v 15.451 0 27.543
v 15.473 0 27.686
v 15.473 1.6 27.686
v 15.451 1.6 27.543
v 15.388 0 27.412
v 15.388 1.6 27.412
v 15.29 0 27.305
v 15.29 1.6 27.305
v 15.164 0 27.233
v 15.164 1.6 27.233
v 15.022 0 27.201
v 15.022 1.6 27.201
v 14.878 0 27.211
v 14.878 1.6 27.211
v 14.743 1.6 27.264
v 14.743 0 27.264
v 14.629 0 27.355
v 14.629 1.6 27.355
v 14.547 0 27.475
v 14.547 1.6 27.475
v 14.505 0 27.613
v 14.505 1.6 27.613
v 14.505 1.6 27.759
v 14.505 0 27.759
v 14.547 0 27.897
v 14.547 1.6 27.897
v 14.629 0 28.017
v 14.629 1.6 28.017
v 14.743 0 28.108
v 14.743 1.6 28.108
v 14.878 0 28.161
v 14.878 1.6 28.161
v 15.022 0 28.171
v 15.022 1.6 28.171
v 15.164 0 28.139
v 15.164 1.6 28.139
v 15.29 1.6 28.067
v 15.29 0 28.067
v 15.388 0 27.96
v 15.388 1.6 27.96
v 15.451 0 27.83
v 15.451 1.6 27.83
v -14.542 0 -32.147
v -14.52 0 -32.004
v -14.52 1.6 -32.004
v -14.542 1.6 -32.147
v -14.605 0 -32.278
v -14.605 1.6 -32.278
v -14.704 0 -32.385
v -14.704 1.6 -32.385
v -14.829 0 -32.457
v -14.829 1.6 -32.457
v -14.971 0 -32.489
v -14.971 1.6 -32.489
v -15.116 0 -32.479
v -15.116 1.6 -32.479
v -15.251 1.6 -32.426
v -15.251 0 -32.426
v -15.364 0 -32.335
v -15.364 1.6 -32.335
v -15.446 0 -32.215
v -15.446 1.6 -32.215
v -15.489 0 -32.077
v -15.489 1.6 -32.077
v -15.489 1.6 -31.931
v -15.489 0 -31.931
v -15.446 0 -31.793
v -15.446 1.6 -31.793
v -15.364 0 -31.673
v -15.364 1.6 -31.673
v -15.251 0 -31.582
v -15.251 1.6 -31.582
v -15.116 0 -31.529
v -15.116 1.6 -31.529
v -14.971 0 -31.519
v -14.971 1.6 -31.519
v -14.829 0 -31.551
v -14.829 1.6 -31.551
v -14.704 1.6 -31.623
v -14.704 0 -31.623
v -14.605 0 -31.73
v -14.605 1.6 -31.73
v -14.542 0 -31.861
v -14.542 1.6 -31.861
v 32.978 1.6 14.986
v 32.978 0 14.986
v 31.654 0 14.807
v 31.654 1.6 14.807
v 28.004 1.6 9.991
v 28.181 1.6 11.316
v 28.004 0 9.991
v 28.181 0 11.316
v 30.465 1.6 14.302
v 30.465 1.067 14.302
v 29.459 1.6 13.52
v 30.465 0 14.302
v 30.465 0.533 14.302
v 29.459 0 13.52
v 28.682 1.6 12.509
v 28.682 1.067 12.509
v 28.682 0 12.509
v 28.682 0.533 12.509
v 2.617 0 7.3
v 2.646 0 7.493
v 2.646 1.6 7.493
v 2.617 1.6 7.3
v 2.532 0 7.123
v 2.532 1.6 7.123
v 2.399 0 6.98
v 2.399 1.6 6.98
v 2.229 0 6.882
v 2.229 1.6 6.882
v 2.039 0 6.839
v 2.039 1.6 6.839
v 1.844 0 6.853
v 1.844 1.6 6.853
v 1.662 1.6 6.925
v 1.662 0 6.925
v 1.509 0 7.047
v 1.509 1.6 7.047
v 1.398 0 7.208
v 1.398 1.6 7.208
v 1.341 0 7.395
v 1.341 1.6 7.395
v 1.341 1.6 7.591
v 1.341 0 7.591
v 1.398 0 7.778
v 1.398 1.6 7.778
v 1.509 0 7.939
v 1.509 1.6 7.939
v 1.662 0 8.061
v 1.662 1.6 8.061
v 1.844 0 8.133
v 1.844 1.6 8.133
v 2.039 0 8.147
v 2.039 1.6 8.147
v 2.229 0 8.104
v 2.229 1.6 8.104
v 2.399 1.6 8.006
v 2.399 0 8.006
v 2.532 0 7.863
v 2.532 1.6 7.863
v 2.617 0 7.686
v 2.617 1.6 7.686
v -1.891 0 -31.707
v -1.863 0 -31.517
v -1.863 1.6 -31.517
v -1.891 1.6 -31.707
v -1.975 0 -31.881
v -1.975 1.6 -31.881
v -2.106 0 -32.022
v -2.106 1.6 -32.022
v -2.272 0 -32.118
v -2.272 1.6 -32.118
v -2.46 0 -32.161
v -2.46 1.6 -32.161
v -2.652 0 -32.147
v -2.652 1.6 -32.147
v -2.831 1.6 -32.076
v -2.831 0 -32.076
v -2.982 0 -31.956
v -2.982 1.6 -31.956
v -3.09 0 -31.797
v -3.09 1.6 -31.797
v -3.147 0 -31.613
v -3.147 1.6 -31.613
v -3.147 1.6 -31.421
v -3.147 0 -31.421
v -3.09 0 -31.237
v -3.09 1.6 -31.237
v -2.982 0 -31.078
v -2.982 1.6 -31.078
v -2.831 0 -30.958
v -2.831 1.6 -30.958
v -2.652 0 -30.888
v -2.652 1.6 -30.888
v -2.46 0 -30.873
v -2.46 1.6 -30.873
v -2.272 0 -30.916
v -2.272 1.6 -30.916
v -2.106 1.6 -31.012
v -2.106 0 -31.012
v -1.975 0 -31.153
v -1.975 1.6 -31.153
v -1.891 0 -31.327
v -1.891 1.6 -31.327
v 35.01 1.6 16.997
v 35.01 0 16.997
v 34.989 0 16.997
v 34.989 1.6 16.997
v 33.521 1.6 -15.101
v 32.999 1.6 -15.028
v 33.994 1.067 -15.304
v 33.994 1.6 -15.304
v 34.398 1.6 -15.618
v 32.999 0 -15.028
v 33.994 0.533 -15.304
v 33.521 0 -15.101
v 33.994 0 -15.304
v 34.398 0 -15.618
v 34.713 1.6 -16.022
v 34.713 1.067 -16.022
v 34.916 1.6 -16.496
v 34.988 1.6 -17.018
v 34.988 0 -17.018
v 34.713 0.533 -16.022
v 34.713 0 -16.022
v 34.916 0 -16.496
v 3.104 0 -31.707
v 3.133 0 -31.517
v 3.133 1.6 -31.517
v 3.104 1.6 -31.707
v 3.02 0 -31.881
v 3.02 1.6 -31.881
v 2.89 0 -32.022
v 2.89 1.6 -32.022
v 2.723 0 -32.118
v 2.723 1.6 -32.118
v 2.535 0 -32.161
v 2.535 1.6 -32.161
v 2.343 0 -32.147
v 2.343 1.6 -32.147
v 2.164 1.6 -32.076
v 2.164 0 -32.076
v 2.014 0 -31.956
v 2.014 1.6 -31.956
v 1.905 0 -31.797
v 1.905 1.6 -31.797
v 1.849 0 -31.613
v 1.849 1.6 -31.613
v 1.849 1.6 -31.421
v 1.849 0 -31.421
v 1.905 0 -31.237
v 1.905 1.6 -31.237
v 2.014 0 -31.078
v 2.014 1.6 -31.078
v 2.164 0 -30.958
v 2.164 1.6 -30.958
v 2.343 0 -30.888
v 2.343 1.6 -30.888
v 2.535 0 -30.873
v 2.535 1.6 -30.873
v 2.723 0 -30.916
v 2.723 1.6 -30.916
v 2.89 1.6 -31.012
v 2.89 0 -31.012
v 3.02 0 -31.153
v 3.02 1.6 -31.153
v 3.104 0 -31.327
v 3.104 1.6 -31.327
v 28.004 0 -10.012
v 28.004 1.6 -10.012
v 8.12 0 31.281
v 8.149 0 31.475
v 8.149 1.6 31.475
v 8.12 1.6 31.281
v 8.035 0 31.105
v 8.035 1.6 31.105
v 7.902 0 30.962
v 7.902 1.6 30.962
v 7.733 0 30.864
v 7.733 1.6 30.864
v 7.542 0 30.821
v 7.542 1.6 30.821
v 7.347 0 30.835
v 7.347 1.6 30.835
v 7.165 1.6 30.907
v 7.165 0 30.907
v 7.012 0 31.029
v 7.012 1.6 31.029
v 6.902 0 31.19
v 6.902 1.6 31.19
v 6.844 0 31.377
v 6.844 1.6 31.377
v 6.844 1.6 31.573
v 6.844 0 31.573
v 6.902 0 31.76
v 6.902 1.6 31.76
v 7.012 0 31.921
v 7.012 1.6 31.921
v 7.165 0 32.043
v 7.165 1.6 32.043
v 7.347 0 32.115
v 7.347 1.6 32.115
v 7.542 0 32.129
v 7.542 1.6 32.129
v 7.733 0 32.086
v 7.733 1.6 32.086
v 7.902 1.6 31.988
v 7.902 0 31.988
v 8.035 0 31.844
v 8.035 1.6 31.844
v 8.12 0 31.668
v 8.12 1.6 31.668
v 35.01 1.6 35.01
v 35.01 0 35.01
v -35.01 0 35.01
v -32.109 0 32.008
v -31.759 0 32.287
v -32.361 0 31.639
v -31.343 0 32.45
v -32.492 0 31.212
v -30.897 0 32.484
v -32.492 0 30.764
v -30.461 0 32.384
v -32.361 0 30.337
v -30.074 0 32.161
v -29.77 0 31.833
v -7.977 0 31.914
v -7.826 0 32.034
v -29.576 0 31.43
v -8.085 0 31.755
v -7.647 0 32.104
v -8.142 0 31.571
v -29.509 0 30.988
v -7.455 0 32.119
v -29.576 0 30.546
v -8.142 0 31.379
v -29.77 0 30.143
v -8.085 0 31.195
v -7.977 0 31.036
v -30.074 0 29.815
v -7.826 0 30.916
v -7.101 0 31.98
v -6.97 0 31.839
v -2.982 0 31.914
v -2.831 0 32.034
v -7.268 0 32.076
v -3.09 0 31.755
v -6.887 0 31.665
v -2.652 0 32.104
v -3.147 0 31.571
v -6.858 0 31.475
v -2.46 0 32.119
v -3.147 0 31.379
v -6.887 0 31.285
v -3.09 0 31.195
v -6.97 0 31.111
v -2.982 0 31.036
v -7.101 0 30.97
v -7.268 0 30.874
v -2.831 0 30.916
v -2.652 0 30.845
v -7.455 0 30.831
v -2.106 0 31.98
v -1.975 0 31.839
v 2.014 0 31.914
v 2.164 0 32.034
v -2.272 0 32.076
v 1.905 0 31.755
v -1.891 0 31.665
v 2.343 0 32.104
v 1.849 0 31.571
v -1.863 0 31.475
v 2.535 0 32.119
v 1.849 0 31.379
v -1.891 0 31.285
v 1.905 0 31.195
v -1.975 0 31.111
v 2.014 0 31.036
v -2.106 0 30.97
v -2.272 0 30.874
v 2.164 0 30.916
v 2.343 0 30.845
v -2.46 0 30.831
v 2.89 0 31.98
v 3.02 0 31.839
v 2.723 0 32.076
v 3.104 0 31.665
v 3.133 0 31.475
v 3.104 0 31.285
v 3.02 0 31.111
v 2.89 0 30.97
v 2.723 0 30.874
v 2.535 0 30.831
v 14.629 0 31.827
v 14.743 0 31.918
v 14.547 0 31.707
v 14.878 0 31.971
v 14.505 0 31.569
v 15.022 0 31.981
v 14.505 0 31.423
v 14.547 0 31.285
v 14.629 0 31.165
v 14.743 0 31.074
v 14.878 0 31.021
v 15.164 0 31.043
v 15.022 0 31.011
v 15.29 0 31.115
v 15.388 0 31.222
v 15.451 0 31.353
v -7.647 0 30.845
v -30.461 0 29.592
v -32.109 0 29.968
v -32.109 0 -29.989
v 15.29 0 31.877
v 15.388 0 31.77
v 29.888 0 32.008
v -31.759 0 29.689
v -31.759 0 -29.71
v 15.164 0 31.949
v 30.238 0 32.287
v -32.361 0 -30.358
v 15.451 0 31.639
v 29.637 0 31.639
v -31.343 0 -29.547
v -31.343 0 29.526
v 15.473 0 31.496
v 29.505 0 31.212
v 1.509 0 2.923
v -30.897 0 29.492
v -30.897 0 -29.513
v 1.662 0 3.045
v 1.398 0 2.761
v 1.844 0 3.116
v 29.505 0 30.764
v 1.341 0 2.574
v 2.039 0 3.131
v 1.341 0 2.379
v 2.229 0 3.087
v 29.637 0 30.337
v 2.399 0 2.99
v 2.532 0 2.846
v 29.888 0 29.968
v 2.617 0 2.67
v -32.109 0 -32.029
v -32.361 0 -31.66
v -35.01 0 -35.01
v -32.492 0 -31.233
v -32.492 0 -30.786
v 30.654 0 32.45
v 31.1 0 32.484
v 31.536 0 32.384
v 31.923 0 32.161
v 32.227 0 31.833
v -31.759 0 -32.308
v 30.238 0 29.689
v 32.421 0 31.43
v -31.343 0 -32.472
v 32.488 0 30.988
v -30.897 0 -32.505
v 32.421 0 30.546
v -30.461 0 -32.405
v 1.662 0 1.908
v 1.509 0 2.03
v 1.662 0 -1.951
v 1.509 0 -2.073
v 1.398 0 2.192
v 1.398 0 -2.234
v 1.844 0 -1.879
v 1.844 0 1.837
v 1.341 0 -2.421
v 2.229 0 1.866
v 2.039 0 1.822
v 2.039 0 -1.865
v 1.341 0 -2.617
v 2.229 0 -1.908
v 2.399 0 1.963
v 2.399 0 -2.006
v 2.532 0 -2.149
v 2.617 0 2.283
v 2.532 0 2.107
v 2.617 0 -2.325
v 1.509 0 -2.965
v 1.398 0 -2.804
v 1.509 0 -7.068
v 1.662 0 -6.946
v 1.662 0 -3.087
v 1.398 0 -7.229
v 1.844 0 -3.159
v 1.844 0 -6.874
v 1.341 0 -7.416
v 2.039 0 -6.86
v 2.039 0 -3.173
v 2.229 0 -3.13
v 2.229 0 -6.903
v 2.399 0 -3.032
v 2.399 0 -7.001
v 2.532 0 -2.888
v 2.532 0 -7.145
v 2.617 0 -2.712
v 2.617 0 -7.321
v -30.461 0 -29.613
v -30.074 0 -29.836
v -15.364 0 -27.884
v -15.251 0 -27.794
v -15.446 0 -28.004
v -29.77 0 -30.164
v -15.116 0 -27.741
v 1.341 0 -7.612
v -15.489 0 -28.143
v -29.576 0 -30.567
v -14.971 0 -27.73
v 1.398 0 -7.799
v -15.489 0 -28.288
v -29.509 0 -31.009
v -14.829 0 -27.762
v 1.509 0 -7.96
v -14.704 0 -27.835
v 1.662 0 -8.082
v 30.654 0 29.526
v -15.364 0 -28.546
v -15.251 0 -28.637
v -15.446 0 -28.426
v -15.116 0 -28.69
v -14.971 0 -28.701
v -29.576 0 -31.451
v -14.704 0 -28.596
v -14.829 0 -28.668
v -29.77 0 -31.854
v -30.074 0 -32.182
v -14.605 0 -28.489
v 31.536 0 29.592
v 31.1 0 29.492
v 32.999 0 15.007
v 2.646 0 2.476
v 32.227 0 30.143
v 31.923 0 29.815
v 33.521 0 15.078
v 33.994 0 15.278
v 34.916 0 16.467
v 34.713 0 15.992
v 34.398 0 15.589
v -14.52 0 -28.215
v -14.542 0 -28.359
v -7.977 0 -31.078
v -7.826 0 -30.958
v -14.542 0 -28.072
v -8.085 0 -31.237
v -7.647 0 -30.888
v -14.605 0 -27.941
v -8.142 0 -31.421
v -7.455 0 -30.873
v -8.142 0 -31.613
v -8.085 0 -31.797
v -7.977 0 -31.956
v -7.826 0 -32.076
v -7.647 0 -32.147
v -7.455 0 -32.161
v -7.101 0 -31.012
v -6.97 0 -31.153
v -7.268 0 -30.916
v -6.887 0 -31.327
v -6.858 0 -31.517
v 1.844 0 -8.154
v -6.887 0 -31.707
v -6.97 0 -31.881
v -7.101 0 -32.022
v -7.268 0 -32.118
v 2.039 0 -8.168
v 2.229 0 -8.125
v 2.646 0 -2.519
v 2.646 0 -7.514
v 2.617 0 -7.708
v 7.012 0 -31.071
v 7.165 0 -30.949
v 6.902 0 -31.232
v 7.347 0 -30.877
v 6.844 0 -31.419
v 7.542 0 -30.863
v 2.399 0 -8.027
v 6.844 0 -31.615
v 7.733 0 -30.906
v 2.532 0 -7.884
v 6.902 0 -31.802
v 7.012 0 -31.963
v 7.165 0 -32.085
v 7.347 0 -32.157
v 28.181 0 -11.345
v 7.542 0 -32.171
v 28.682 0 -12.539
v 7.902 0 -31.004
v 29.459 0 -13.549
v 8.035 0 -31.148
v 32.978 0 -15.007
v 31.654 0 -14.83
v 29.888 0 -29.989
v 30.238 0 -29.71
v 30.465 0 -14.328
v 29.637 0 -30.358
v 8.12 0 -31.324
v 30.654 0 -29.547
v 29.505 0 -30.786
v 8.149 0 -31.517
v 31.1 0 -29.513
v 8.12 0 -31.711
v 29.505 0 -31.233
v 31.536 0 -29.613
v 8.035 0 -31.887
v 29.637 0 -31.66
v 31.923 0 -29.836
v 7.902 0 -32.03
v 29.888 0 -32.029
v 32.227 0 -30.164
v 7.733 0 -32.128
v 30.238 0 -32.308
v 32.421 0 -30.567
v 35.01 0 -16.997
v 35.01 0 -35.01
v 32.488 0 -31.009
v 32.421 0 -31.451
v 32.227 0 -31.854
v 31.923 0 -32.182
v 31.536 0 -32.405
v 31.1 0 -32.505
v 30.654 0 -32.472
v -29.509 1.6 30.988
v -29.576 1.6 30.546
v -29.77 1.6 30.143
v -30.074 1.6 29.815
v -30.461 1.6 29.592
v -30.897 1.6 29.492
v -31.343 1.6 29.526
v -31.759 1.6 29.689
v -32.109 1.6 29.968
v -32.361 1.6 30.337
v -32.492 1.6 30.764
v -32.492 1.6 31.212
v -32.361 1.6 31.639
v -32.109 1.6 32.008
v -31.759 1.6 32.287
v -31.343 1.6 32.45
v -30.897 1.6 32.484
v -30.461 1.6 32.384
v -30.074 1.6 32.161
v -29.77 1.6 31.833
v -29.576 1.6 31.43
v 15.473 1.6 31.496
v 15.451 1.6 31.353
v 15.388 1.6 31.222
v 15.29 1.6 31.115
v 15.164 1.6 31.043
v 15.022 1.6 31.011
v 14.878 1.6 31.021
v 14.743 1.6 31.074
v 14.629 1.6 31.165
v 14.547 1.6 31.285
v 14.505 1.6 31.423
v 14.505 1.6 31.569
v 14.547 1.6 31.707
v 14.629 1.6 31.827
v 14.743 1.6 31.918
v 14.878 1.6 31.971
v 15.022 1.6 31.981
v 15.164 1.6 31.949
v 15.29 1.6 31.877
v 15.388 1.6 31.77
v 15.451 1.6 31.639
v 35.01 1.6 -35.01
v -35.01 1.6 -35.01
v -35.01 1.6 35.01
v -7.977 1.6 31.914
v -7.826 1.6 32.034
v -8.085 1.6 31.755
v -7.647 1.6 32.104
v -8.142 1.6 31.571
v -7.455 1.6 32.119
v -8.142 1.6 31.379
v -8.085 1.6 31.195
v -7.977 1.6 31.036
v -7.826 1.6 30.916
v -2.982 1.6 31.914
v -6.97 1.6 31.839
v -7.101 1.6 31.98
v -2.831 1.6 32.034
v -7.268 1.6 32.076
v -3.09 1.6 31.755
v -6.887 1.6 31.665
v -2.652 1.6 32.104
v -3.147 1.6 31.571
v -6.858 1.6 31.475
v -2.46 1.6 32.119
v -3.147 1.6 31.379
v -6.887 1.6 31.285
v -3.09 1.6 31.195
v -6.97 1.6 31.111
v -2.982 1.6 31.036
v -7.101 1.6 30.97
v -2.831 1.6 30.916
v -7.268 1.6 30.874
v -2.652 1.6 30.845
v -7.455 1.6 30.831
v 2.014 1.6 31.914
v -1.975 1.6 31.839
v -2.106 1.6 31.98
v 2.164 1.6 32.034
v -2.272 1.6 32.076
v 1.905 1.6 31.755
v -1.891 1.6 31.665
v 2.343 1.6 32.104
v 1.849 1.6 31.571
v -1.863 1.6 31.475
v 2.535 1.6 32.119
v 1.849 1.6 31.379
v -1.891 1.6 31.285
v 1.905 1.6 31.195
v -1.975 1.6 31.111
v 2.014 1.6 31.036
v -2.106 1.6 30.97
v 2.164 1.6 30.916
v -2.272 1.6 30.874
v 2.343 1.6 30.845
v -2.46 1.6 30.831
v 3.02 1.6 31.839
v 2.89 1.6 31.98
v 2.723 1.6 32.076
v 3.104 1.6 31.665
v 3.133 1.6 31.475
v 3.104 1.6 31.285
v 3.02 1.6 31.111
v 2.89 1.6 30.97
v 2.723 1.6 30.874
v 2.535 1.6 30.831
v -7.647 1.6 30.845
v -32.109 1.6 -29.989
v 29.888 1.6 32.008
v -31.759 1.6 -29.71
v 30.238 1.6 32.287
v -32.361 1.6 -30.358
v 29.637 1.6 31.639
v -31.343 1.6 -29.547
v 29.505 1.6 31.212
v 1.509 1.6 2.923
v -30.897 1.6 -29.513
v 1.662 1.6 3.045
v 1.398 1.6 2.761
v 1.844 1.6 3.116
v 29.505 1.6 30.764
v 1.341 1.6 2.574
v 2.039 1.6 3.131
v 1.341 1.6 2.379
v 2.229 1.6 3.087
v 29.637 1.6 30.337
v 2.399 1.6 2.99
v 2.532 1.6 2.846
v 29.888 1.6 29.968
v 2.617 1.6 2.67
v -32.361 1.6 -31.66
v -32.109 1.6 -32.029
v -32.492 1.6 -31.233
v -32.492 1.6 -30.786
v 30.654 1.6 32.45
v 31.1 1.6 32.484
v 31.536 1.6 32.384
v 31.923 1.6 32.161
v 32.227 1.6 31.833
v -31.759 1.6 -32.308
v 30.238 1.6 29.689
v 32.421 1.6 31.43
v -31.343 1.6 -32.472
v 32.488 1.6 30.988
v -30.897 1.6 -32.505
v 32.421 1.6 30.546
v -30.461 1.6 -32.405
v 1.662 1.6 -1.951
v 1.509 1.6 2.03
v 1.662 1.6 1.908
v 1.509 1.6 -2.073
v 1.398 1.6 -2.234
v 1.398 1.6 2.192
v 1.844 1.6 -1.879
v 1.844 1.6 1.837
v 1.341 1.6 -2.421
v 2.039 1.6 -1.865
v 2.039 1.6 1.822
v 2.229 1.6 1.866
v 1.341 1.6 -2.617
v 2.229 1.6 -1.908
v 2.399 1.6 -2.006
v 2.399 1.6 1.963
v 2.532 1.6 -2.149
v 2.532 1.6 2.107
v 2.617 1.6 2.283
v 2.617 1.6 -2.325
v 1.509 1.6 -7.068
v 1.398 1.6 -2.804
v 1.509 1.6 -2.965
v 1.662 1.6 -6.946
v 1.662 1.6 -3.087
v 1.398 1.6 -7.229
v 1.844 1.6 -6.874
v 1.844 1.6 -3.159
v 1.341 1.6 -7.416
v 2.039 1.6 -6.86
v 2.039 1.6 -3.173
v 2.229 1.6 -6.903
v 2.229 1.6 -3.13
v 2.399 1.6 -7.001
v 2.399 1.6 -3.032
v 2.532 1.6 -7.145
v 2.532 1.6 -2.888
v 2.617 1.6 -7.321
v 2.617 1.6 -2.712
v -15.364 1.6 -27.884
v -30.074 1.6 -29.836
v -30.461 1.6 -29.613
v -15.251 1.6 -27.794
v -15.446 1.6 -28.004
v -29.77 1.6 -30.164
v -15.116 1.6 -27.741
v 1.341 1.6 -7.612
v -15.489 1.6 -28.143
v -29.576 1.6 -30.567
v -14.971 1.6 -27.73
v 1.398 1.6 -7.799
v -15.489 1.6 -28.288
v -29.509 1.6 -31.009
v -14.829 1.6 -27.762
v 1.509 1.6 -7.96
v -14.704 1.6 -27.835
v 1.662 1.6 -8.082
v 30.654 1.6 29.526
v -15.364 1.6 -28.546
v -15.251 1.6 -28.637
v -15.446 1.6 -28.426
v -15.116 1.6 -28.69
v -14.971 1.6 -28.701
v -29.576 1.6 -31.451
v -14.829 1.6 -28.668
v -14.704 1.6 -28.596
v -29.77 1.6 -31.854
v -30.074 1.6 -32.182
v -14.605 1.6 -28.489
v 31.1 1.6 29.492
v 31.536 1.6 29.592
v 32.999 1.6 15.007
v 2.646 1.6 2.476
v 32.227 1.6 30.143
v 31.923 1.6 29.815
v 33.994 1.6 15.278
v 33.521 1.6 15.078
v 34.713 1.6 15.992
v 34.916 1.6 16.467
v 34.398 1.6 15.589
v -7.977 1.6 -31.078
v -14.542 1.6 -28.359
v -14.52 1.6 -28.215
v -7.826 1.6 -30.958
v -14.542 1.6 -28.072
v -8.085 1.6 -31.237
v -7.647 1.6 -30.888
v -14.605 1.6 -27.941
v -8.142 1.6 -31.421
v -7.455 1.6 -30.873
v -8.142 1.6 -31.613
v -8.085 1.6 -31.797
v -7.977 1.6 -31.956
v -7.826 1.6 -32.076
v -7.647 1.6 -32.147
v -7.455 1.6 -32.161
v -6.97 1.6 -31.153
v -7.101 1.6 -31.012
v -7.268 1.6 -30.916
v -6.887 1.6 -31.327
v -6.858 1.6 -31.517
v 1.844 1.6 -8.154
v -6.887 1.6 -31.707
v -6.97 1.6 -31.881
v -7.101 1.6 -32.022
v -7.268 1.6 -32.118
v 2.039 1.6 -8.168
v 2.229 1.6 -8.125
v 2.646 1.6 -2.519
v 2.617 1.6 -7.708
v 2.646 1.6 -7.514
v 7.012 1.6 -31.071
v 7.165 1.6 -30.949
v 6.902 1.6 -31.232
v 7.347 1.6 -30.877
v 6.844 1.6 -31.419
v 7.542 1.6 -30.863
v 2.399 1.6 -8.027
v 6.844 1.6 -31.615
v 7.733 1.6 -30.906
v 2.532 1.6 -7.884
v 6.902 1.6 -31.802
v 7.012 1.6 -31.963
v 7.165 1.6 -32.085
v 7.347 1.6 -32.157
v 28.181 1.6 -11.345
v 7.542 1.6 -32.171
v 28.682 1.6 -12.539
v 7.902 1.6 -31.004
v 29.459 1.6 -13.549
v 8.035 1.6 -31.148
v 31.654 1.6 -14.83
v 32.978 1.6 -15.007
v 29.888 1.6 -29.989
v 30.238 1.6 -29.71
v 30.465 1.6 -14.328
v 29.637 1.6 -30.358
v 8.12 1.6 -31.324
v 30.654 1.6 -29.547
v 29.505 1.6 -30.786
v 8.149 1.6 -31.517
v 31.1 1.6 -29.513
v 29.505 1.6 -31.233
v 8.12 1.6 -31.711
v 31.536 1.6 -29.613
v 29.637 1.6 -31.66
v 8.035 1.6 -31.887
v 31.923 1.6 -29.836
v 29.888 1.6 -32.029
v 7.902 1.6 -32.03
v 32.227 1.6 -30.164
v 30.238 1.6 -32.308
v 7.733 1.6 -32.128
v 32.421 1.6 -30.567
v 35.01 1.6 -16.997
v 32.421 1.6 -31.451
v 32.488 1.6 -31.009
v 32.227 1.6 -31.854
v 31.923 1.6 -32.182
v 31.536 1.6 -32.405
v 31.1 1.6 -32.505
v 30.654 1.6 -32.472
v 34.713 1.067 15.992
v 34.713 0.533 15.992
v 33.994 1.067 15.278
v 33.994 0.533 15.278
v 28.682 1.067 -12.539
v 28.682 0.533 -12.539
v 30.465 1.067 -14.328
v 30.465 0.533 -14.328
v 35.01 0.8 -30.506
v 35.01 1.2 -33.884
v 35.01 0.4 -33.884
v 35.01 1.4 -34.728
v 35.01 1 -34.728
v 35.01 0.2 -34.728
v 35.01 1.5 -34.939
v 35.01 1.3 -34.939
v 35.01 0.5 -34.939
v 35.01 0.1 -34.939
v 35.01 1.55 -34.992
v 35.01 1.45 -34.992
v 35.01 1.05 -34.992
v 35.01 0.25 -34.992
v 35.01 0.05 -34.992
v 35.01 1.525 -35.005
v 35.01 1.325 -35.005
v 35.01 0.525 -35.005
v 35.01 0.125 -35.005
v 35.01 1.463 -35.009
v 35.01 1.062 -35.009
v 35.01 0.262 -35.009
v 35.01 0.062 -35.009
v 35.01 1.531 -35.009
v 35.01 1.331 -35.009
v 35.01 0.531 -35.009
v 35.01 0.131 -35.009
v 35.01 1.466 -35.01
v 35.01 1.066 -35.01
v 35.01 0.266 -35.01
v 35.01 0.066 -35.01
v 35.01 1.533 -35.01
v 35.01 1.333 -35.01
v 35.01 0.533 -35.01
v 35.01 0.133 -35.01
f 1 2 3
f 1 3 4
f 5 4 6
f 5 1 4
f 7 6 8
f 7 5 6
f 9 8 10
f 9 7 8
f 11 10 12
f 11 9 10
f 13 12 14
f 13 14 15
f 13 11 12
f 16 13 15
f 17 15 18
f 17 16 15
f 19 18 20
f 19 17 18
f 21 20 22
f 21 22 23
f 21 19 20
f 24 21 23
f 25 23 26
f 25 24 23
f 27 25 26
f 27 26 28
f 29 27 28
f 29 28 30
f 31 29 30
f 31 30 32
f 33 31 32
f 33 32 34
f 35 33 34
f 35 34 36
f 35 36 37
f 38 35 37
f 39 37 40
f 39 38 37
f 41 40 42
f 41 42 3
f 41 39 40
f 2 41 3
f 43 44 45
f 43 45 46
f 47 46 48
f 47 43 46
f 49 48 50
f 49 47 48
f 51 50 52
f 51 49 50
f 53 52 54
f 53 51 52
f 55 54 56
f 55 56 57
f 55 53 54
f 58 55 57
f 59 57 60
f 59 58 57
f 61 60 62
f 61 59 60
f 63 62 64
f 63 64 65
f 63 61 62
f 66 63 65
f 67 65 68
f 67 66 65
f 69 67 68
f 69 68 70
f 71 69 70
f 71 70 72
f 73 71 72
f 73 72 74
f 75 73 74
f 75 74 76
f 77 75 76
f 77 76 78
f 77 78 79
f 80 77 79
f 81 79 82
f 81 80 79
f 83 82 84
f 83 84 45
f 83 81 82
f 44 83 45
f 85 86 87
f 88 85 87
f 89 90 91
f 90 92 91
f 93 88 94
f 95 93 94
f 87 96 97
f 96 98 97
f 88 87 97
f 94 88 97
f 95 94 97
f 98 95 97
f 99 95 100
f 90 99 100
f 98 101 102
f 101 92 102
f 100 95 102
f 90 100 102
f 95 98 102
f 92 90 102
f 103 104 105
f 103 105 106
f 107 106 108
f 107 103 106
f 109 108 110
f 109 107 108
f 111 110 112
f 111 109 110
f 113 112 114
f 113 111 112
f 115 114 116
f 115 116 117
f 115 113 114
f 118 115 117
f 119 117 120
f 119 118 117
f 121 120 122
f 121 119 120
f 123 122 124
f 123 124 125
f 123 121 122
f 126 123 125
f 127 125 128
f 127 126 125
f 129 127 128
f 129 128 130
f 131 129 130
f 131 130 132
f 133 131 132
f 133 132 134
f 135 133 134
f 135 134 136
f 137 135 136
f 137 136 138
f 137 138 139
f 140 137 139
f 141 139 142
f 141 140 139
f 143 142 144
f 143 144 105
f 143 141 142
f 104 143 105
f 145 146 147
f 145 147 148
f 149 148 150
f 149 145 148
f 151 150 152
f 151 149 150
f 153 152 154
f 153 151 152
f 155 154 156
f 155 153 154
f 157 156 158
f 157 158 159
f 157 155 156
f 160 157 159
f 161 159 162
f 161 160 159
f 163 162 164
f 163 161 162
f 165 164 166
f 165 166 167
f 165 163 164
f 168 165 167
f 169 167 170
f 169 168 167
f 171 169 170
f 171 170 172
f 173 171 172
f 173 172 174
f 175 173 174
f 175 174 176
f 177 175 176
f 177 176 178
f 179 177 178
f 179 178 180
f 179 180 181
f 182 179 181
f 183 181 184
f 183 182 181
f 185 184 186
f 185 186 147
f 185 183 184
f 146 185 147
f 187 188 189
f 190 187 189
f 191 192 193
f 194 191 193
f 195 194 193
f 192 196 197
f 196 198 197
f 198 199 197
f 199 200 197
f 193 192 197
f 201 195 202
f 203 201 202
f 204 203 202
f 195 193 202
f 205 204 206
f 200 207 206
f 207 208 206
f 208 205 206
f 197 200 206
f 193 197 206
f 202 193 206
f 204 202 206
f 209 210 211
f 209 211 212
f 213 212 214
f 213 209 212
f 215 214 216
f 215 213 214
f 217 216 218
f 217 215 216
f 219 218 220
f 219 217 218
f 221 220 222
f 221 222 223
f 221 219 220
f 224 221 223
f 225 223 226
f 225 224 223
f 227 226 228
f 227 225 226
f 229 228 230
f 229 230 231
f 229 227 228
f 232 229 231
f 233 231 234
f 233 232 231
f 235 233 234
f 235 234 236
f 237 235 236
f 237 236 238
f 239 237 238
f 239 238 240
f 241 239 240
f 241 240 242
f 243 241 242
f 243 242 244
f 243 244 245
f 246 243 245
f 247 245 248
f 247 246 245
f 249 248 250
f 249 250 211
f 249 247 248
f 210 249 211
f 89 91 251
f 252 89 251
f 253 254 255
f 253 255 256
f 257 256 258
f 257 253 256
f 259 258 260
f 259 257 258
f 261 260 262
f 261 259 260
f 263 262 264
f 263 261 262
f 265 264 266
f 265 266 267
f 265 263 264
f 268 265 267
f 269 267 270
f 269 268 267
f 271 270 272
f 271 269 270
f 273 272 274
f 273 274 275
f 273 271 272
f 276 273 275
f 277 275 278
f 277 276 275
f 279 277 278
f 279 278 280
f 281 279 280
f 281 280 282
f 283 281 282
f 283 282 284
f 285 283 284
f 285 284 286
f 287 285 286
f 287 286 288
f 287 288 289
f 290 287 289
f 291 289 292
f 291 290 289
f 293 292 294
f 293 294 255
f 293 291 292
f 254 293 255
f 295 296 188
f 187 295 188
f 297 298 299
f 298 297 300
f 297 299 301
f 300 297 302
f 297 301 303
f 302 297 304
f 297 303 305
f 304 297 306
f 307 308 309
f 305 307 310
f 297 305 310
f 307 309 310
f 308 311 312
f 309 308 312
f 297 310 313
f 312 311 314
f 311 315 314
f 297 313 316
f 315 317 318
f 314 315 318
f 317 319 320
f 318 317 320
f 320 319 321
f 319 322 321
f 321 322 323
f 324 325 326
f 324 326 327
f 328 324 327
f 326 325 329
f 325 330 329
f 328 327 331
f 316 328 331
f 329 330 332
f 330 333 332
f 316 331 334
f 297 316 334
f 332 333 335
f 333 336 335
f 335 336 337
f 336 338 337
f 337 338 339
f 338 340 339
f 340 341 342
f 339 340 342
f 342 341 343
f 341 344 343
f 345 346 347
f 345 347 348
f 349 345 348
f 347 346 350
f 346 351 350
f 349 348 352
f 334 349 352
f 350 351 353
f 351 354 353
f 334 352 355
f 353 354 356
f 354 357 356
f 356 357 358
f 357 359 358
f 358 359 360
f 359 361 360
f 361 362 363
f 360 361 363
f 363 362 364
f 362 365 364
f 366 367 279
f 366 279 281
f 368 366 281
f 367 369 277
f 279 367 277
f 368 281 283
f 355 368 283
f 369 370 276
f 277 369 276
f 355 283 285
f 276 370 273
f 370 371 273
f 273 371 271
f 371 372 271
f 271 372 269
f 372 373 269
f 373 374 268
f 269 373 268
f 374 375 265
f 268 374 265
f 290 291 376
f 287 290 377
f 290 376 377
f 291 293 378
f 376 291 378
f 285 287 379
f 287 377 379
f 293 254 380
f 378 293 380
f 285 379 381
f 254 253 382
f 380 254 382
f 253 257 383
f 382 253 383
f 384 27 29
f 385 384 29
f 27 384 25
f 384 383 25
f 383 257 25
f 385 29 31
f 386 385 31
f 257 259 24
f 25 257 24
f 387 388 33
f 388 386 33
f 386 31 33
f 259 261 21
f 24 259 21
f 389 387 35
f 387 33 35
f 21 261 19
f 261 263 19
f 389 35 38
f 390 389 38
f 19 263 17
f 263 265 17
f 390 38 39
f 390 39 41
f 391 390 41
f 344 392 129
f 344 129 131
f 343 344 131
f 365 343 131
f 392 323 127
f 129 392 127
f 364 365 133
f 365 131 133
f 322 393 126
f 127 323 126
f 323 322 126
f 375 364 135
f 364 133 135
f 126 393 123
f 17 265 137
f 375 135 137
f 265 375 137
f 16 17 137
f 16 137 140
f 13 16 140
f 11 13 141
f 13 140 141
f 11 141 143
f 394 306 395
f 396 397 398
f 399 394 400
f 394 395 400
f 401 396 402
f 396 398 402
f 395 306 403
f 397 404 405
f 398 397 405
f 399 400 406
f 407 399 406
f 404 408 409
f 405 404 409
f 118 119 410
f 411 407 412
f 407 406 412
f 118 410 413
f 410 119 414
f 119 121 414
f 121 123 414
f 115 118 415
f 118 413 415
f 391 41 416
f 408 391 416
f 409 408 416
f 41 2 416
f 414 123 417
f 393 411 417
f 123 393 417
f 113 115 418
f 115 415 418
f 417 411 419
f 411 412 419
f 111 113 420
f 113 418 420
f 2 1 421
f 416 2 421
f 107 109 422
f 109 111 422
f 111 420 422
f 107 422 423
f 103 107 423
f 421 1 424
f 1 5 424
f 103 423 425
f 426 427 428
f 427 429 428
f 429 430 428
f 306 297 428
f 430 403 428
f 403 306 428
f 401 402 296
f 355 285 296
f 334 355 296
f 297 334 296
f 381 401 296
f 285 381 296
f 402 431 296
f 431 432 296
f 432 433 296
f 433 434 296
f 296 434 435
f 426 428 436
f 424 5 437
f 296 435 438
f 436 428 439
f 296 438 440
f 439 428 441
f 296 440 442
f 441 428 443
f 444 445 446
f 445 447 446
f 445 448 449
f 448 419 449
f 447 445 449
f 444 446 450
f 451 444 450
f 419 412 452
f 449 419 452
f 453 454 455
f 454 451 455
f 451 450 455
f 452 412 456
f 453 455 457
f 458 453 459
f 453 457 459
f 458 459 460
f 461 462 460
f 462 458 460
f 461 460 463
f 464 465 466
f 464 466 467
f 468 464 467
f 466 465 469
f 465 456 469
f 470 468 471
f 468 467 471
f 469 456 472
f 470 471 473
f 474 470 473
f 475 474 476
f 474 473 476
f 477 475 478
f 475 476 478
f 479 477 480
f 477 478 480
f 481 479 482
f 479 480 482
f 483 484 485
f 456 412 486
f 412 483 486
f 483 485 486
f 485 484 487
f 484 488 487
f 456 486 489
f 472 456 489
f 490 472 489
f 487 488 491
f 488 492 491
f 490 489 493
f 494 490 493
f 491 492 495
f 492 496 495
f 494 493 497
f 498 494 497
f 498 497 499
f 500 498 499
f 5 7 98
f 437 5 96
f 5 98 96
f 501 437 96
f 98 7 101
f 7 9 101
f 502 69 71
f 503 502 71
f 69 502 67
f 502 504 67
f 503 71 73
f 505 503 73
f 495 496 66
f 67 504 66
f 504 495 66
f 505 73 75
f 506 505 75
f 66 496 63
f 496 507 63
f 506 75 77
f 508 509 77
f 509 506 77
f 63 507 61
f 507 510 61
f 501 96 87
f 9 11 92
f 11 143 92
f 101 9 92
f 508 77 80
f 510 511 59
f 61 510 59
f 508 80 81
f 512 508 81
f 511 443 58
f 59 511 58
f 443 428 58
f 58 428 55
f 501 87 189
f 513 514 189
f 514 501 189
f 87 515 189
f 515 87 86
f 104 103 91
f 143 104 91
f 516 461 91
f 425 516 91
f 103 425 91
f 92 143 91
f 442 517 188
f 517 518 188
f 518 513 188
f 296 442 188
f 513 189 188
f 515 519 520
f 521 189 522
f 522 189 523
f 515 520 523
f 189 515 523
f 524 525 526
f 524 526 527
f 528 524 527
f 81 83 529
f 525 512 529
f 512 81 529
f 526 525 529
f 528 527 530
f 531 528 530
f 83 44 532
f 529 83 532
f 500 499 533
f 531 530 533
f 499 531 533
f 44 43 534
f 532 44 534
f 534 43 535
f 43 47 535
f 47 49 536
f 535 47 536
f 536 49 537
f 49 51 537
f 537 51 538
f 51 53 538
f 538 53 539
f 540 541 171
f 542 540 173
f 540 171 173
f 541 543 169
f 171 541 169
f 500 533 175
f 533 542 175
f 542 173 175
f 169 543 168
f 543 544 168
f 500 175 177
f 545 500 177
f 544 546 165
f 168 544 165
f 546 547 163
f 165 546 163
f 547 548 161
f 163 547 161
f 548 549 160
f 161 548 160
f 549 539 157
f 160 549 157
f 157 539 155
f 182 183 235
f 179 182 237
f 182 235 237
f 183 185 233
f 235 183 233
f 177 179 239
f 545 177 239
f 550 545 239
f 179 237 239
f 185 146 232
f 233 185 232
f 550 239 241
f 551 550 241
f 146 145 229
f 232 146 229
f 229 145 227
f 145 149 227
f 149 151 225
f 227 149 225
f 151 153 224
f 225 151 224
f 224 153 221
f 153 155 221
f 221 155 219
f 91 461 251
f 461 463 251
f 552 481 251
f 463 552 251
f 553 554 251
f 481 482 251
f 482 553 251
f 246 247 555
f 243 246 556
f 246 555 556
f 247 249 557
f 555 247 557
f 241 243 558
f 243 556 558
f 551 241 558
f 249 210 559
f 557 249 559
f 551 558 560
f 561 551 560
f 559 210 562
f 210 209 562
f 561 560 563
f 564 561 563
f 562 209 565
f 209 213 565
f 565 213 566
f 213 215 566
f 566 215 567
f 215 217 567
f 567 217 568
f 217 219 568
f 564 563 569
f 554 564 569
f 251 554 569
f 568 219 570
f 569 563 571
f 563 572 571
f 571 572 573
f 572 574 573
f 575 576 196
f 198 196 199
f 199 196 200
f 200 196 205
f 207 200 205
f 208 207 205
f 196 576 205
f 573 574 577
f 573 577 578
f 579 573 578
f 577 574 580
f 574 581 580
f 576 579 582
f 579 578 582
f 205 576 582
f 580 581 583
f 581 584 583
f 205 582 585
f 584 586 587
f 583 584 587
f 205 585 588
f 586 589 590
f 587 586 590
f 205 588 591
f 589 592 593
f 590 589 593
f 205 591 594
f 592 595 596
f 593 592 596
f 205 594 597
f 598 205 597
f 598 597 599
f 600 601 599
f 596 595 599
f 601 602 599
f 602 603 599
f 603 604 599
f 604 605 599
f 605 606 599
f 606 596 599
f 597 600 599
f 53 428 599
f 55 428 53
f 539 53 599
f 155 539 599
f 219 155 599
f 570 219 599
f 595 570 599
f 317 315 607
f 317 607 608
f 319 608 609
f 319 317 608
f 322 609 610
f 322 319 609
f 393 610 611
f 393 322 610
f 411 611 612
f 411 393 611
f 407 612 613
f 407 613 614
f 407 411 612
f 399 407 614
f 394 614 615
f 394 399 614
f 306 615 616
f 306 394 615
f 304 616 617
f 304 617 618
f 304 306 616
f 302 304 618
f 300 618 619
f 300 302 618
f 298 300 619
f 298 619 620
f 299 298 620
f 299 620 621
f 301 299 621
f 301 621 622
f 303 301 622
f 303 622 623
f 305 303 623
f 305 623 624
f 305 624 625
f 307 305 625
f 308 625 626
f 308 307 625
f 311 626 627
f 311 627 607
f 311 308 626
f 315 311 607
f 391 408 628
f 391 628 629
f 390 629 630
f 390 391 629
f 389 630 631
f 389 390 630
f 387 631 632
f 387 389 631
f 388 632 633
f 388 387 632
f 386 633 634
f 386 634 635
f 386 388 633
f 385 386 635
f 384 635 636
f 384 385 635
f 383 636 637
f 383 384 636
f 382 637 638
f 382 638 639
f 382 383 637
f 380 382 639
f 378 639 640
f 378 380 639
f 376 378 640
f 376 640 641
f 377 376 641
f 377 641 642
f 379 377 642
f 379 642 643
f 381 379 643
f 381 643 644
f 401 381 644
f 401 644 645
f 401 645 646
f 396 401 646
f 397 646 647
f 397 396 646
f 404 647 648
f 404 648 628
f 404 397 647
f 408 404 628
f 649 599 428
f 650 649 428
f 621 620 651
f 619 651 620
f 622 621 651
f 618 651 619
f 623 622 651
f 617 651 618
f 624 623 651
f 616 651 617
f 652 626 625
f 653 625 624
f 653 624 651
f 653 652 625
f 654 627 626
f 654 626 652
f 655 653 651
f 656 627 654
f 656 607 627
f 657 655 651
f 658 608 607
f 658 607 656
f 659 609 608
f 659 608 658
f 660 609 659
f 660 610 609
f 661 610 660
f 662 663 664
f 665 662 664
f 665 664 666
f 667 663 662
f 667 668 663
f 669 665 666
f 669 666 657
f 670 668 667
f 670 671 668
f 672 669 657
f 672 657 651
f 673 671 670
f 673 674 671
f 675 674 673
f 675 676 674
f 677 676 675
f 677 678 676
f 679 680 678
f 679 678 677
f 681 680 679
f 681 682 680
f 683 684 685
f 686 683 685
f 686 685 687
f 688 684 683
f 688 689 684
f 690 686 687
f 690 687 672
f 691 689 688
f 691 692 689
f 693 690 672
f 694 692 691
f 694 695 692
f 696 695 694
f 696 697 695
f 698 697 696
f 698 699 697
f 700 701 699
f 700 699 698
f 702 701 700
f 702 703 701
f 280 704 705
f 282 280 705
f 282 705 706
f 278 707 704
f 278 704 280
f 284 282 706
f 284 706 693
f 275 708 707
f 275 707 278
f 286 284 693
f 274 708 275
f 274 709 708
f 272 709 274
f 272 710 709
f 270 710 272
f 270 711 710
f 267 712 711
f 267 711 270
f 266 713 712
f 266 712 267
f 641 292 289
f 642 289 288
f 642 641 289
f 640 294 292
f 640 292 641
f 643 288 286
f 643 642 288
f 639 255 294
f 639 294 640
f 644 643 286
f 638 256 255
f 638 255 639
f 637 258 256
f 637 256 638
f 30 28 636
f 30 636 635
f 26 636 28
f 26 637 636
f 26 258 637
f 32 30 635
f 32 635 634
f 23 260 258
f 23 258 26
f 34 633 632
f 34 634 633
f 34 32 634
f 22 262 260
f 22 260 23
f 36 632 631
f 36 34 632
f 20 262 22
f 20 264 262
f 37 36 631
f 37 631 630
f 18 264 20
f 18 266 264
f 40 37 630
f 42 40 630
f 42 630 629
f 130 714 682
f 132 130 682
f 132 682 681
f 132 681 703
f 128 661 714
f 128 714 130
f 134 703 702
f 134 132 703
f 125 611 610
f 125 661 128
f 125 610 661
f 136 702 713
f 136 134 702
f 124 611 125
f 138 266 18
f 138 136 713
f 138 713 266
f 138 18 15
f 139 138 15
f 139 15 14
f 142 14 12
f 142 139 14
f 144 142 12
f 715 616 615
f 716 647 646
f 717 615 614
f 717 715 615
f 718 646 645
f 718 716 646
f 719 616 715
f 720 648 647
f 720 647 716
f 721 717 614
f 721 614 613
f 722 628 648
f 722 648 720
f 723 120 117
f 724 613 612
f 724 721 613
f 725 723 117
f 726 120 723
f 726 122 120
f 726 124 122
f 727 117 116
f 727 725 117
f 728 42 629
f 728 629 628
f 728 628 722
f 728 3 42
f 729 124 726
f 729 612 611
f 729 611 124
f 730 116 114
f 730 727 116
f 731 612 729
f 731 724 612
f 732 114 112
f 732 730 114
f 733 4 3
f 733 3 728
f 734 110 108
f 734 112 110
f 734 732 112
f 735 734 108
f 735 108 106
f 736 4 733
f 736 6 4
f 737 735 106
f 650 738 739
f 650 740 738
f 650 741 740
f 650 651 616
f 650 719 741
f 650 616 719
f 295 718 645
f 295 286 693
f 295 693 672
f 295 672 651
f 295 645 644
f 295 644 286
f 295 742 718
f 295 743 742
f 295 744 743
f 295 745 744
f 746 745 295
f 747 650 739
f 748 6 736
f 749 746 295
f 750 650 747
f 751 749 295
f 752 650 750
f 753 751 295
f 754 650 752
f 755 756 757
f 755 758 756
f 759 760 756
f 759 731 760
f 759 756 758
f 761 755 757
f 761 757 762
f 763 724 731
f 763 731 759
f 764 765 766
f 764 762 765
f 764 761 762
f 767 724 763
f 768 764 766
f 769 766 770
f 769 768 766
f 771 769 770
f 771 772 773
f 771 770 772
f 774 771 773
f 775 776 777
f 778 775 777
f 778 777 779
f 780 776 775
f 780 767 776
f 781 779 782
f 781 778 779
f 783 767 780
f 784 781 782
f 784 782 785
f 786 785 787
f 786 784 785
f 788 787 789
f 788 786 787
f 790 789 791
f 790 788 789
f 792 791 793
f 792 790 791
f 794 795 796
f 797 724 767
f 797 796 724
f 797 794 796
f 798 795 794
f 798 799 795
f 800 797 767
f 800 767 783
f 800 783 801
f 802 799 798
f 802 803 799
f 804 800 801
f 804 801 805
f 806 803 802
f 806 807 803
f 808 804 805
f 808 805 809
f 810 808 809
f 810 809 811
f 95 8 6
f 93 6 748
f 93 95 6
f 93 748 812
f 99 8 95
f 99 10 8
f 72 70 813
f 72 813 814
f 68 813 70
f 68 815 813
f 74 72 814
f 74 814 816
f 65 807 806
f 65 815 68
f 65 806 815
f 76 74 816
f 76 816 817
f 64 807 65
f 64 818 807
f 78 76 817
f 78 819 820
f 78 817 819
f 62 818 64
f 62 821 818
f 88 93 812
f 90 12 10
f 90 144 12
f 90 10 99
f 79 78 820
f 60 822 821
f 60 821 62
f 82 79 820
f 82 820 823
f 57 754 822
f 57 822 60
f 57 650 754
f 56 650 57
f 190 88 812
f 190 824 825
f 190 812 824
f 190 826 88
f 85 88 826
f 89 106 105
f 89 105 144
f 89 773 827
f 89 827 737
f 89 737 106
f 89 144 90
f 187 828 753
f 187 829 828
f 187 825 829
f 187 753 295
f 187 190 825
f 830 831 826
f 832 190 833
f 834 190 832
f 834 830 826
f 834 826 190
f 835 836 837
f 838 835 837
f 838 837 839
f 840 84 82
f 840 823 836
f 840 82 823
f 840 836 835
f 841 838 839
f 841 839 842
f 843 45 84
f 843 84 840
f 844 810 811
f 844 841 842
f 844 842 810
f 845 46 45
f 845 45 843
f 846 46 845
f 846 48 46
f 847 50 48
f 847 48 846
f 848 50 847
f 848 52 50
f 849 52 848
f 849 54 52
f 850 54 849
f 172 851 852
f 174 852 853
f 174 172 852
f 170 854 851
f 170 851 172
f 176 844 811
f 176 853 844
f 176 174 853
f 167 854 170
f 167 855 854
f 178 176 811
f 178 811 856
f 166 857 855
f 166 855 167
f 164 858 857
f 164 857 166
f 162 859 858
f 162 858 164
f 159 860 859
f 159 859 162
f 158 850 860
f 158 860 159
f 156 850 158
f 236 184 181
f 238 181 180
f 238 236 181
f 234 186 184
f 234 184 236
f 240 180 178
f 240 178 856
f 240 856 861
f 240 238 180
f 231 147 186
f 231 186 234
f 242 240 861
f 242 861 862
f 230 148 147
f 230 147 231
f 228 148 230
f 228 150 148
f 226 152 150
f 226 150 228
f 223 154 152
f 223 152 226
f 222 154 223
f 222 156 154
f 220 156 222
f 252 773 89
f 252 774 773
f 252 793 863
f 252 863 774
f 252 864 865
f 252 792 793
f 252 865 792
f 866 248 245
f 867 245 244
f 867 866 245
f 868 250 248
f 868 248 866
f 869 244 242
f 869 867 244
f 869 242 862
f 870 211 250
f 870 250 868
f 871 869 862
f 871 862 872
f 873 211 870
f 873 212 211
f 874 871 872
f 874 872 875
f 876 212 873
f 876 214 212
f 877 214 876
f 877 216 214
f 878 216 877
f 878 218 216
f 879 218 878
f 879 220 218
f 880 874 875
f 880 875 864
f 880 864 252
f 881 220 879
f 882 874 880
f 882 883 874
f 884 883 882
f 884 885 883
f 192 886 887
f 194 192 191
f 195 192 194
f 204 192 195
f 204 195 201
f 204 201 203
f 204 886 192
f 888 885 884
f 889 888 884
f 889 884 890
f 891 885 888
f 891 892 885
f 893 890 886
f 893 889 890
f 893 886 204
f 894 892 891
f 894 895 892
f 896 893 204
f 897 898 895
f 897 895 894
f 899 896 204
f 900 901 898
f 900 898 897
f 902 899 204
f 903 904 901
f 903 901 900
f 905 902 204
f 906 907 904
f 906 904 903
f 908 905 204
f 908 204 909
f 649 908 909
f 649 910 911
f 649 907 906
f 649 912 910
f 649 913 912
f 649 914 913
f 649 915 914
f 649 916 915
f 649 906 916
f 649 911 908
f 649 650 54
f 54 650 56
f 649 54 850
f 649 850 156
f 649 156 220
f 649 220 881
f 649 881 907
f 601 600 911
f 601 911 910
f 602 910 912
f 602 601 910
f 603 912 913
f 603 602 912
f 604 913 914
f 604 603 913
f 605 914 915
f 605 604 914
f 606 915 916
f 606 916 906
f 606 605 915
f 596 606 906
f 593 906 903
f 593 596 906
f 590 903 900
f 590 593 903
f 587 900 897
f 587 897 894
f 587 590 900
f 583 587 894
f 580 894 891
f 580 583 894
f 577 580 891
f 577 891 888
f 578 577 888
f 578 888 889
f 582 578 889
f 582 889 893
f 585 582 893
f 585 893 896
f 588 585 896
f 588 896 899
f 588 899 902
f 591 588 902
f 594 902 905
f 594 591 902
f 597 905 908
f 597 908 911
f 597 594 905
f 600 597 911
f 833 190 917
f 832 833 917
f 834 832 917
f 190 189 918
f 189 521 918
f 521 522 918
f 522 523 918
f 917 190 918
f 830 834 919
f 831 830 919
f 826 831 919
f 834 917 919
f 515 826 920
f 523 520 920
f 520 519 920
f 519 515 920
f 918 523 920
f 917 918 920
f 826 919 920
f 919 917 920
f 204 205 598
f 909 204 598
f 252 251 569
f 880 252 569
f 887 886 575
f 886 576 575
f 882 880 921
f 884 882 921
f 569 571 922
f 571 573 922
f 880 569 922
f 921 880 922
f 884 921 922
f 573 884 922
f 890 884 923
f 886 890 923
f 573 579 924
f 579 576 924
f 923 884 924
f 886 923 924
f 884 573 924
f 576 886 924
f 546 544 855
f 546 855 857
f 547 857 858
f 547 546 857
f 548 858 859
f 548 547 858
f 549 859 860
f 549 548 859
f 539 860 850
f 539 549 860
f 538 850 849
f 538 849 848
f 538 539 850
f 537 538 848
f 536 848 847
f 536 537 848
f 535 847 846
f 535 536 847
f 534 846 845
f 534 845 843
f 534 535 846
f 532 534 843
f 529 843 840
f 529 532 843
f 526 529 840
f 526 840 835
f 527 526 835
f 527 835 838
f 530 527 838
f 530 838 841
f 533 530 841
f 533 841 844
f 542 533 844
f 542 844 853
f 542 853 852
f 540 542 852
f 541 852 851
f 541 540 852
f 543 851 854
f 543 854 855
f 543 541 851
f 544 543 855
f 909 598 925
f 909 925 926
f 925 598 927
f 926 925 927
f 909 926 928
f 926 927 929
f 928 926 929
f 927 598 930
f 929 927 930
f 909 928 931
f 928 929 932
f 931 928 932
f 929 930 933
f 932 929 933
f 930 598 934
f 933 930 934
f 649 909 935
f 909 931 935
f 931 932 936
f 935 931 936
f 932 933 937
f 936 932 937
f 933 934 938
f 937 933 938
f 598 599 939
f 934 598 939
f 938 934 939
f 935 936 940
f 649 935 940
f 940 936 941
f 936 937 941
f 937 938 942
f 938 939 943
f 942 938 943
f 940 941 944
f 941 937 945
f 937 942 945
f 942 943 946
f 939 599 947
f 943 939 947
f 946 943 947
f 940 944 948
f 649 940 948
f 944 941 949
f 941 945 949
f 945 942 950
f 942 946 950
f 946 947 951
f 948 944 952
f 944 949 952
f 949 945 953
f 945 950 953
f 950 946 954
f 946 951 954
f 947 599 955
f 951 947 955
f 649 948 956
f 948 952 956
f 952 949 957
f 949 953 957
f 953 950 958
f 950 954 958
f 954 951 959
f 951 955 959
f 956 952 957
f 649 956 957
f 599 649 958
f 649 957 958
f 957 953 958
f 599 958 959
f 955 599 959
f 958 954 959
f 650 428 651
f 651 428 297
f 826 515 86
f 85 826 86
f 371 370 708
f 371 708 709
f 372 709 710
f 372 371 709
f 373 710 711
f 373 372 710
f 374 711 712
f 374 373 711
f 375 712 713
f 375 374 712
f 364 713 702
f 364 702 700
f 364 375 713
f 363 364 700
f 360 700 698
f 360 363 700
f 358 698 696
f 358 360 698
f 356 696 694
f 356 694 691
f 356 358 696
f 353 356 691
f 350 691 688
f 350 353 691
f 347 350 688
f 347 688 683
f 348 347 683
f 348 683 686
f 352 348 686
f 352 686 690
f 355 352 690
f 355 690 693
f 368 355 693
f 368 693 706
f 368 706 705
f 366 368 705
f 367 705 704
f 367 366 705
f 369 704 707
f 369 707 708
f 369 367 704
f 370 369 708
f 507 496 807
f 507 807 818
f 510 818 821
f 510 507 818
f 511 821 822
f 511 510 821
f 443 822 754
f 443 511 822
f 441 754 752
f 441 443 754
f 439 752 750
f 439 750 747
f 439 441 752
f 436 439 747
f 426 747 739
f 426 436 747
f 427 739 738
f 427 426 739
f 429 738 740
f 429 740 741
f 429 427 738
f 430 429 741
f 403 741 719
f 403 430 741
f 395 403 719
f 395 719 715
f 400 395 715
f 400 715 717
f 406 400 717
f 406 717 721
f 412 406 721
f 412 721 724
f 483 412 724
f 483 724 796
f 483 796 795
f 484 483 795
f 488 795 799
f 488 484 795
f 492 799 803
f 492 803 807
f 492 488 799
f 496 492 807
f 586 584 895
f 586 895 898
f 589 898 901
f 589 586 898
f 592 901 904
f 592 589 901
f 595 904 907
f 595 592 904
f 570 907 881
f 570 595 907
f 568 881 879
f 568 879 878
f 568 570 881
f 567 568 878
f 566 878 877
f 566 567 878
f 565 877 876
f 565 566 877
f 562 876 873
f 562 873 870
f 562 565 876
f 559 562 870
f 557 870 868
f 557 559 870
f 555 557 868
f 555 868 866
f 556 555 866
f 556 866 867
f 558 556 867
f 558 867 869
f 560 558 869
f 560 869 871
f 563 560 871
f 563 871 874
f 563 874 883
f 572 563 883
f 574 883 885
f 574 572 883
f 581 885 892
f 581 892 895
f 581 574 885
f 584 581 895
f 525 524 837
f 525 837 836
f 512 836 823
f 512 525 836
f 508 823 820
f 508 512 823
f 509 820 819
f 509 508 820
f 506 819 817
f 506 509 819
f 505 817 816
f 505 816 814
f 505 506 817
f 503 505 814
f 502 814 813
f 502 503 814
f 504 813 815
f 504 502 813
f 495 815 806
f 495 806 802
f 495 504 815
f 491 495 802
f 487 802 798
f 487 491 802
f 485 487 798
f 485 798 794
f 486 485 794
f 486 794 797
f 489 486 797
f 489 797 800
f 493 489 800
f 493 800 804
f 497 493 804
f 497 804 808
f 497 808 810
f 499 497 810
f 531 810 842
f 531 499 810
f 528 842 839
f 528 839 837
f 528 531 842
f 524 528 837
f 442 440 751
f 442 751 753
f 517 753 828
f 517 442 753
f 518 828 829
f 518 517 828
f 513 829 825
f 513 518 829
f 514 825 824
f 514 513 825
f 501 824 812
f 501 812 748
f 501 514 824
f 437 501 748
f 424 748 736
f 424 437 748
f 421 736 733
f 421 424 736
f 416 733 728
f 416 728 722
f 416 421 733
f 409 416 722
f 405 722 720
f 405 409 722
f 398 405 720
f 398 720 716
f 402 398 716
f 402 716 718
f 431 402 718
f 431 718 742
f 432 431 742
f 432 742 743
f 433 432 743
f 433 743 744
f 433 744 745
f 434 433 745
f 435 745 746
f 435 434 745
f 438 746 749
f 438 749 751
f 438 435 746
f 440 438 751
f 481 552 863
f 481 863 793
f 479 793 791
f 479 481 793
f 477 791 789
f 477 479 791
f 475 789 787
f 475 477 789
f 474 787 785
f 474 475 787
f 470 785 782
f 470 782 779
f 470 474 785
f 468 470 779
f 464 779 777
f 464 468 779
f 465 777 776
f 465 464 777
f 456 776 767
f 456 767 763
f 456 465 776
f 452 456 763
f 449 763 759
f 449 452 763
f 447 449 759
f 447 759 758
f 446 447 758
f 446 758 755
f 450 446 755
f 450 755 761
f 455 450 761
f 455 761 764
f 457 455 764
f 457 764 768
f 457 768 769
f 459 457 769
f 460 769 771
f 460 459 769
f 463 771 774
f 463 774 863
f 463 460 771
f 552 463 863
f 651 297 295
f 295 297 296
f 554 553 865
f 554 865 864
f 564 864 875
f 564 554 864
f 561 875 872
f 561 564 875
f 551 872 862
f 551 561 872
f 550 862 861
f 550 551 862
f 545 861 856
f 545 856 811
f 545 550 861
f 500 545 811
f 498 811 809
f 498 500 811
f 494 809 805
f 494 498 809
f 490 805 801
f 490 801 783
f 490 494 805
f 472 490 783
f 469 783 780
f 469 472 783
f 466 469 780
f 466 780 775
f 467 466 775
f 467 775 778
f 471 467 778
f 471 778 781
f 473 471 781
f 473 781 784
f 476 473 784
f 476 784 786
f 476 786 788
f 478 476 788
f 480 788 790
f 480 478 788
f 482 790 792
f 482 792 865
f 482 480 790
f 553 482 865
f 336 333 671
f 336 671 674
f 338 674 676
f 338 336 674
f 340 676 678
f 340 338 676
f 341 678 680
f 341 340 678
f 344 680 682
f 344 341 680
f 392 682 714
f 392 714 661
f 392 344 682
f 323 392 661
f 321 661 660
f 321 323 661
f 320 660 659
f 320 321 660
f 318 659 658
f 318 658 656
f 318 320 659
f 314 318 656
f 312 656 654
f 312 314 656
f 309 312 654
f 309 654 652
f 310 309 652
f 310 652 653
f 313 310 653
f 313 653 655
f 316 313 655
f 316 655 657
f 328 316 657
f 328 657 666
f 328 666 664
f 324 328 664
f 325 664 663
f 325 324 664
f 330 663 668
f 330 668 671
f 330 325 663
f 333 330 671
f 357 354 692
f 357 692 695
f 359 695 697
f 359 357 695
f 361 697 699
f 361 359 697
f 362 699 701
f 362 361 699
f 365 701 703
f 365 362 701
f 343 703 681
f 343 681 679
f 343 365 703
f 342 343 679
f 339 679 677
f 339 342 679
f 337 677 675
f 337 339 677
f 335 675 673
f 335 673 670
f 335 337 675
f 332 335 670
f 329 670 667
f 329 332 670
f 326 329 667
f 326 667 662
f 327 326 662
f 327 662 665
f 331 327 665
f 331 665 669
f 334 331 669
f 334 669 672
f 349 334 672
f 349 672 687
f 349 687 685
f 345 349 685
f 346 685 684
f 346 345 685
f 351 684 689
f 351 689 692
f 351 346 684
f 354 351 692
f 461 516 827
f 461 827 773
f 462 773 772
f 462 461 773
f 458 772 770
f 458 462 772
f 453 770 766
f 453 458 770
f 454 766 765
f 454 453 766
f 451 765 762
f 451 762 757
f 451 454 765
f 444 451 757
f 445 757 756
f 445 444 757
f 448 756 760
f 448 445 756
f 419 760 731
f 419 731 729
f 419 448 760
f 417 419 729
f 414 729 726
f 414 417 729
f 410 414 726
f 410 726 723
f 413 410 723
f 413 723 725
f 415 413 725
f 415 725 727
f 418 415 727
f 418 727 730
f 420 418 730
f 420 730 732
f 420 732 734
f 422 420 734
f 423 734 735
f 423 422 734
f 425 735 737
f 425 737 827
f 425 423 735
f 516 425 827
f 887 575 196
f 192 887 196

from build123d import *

# Parameters (mm, degrees)
SKETCH1_R           = 0.645583979
SKETCH1_R_2         = 0.656166882
SKETCH1_R_3         = 0.486835056
SKETCH1_R_4         = 1.5
BOSS_EXTRUDE1_DEPTH = 1.6


with BuildPart() as part:
    # Sketch1 → Boss-Extrude1 (new body)
    with BuildSketch(Plane(origin=(0, 0, 0), x_dir=(1, 0, 0), z_dir=(0, 1, 0))):
        with BuildLine():
            Line((35.009657829, 35.009663213), (-35.009668596, 35.009663213))
            Line((-35.009668596, 35.009663213), (-35.009668596, -35.009663213))
            Line((-35.009668596, -35.009663213), (35.009668596, -35.009663213))
            Line((35.009668596, -35.009663213), (35.009668596, -16.996819979))
            Line((35.009668596, -16.996819979), (34.988502791, -16.996830745))
            add(Edge.make_bspline(
                [(34.988502791, -16.996830745), (34.988502791, -15.896155035), (34.078330096, -15.007158911), (32.998830957, -15.007158912)],
                knots=[6, 6, 6, 6, 7, 7, 7, 7], degree=3))
            Line((32.998830957, -15.007158912), (32.977665152, -14.985993106))
            add(Edge.make_bspline(
                [(32.977665152, -14.985993106), (30.226002792, -14.985993106), (28.003507099, -12.742331608), (28.003507099, -9.990669248)],
                knots=[8, 8, 8, 8, 9, 9, 9, 9], degree=3))
            Line((28.003507099, -9.990669248), (28.003507099, 9.990669248))
            Line((28.003507099, 9.990669248), (28.003507099, 10.011835053))
            add(Edge.make_bspline(
                [(28.003507099, 10.011835053), (28.003507099, 12.784663218), (30.226002792, 15.007158911), (32.977675917, 15.007158911)],
                knots=[11, 11, 11, 11, 12, 12, 12, 12], degree=3))
            Line((32.977675917, 15.007158911), (32.99883634, 15.028319334))
            add(Edge.make_bspline(
                [(32.99883634, 15.028319334), (34.078335478, 15.028322254), (34.988494945, 15.938497412), (34.988492025, 17.017996551)],
                knots=[13, 13, 13, 13, 14, 14, 14, 14], degree=3))
            Line((34.988492025, 17.017996551), (35.00965783, 16.996830745))
            add(Edge.make_bspline(
                [(35.00965783, 16.996830745), (35.009657829, 35.009673979), (35.009657829, 35.009663213)],
                knots=[0, 0, 0, 1, 1, 1], degree=2))
        make_face()
        with Locations((-7.503590222, 31.517165368)):
            Circle(SKETCH1_R, mode=Mode.SUBTRACT)
        with Locations((-2.508255598, 31.517165368)):
            Circle(SKETCH1_R, mode=Mode.SUBTRACT)
        with Locations((2.487079026, 31.517165369)):
            Circle(SKETCH1_R, mode=Mode.SUBTRACT)
        with Locations((7.492996552, 31.517165369)):
            Circle(SKETCH1_R_2, mode=Mode.SUBTRACT)
        with Locations((-15.007175061, 28.215170536)):
            Circle(SKETCH1_R_3, mode=Mode.SUBTRACT)
        with Locations((-15.007175061, 32.004000424)):
            Circle(SKETCH1_R_3, mode=Mode.SUBTRACT)
        with Locations((1.989661068, 7.51416236)):
            Circle(SKETCH1_R_2, mode=Mode.SUBTRACT)
        with Locations((1.989661069, 2.518838502)):
            Circle(SKETCH1_R_2, mode=Mode.SUBTRACT)
        with Locations((1.989661069, -2.476496122)):
            Circle(SKETCH1_R_2, mode=Mode.SUBTRACT)
        with Locations((1.989661069, -7.492996551)):
            Circle(SKETCH1_R_2, mode=Mode.SUBTRACT)
        with Locations((-7.503590219, -31.474833755)):
            Circle(SKETCH1_R, mode=Mode.SUBTRACT)
        with Locations((-2.508255595, -31.474833755)):
            Circle(SKETCH1_R, mode=Mode.SUBTRACT)
        with Locations((2.487079029, -31.474833754)):
            Circle(SKETCH1_R, mode=Mode.SUBTRACT)
        with Locations((7.492996555, -31.474833754)):
            Circle(SKETCH1_R_2, mode=Mode.SUBTRACT)
        with Locations((-31.009175272, 31.009164506)):
            Circle(SKETCH1_R_4, mode=Mode.SUBTRACT)
        with Locations((30.9879987, 31.009164509)):
            Circle(SKETCH1_R_4, mode=Mode.SUBTRACT)
        with Locations((-31.009175269, -30.9879987)):
            Circle(SKETCH1_R_4, mode=Mode.SUBTRACT)
        with Locations((30.987998703, -30.987998698)):
            Circle(SKETCH1_R_4, mode=Mode.SUBTRACT)
        with Locations((14.985998491, -27.686003867)):
            Circle(SKETCH1_R_3, mode=Mode.SUBTRACT)
        with Locations((14.985998491, -31.495999559)):
            Circle(SKETCH1_R_3, mode=Mode.SUBTRACT)
    extrude(amount=BOSS_EXTRUDE1_DEPTH)


solid = part.part
